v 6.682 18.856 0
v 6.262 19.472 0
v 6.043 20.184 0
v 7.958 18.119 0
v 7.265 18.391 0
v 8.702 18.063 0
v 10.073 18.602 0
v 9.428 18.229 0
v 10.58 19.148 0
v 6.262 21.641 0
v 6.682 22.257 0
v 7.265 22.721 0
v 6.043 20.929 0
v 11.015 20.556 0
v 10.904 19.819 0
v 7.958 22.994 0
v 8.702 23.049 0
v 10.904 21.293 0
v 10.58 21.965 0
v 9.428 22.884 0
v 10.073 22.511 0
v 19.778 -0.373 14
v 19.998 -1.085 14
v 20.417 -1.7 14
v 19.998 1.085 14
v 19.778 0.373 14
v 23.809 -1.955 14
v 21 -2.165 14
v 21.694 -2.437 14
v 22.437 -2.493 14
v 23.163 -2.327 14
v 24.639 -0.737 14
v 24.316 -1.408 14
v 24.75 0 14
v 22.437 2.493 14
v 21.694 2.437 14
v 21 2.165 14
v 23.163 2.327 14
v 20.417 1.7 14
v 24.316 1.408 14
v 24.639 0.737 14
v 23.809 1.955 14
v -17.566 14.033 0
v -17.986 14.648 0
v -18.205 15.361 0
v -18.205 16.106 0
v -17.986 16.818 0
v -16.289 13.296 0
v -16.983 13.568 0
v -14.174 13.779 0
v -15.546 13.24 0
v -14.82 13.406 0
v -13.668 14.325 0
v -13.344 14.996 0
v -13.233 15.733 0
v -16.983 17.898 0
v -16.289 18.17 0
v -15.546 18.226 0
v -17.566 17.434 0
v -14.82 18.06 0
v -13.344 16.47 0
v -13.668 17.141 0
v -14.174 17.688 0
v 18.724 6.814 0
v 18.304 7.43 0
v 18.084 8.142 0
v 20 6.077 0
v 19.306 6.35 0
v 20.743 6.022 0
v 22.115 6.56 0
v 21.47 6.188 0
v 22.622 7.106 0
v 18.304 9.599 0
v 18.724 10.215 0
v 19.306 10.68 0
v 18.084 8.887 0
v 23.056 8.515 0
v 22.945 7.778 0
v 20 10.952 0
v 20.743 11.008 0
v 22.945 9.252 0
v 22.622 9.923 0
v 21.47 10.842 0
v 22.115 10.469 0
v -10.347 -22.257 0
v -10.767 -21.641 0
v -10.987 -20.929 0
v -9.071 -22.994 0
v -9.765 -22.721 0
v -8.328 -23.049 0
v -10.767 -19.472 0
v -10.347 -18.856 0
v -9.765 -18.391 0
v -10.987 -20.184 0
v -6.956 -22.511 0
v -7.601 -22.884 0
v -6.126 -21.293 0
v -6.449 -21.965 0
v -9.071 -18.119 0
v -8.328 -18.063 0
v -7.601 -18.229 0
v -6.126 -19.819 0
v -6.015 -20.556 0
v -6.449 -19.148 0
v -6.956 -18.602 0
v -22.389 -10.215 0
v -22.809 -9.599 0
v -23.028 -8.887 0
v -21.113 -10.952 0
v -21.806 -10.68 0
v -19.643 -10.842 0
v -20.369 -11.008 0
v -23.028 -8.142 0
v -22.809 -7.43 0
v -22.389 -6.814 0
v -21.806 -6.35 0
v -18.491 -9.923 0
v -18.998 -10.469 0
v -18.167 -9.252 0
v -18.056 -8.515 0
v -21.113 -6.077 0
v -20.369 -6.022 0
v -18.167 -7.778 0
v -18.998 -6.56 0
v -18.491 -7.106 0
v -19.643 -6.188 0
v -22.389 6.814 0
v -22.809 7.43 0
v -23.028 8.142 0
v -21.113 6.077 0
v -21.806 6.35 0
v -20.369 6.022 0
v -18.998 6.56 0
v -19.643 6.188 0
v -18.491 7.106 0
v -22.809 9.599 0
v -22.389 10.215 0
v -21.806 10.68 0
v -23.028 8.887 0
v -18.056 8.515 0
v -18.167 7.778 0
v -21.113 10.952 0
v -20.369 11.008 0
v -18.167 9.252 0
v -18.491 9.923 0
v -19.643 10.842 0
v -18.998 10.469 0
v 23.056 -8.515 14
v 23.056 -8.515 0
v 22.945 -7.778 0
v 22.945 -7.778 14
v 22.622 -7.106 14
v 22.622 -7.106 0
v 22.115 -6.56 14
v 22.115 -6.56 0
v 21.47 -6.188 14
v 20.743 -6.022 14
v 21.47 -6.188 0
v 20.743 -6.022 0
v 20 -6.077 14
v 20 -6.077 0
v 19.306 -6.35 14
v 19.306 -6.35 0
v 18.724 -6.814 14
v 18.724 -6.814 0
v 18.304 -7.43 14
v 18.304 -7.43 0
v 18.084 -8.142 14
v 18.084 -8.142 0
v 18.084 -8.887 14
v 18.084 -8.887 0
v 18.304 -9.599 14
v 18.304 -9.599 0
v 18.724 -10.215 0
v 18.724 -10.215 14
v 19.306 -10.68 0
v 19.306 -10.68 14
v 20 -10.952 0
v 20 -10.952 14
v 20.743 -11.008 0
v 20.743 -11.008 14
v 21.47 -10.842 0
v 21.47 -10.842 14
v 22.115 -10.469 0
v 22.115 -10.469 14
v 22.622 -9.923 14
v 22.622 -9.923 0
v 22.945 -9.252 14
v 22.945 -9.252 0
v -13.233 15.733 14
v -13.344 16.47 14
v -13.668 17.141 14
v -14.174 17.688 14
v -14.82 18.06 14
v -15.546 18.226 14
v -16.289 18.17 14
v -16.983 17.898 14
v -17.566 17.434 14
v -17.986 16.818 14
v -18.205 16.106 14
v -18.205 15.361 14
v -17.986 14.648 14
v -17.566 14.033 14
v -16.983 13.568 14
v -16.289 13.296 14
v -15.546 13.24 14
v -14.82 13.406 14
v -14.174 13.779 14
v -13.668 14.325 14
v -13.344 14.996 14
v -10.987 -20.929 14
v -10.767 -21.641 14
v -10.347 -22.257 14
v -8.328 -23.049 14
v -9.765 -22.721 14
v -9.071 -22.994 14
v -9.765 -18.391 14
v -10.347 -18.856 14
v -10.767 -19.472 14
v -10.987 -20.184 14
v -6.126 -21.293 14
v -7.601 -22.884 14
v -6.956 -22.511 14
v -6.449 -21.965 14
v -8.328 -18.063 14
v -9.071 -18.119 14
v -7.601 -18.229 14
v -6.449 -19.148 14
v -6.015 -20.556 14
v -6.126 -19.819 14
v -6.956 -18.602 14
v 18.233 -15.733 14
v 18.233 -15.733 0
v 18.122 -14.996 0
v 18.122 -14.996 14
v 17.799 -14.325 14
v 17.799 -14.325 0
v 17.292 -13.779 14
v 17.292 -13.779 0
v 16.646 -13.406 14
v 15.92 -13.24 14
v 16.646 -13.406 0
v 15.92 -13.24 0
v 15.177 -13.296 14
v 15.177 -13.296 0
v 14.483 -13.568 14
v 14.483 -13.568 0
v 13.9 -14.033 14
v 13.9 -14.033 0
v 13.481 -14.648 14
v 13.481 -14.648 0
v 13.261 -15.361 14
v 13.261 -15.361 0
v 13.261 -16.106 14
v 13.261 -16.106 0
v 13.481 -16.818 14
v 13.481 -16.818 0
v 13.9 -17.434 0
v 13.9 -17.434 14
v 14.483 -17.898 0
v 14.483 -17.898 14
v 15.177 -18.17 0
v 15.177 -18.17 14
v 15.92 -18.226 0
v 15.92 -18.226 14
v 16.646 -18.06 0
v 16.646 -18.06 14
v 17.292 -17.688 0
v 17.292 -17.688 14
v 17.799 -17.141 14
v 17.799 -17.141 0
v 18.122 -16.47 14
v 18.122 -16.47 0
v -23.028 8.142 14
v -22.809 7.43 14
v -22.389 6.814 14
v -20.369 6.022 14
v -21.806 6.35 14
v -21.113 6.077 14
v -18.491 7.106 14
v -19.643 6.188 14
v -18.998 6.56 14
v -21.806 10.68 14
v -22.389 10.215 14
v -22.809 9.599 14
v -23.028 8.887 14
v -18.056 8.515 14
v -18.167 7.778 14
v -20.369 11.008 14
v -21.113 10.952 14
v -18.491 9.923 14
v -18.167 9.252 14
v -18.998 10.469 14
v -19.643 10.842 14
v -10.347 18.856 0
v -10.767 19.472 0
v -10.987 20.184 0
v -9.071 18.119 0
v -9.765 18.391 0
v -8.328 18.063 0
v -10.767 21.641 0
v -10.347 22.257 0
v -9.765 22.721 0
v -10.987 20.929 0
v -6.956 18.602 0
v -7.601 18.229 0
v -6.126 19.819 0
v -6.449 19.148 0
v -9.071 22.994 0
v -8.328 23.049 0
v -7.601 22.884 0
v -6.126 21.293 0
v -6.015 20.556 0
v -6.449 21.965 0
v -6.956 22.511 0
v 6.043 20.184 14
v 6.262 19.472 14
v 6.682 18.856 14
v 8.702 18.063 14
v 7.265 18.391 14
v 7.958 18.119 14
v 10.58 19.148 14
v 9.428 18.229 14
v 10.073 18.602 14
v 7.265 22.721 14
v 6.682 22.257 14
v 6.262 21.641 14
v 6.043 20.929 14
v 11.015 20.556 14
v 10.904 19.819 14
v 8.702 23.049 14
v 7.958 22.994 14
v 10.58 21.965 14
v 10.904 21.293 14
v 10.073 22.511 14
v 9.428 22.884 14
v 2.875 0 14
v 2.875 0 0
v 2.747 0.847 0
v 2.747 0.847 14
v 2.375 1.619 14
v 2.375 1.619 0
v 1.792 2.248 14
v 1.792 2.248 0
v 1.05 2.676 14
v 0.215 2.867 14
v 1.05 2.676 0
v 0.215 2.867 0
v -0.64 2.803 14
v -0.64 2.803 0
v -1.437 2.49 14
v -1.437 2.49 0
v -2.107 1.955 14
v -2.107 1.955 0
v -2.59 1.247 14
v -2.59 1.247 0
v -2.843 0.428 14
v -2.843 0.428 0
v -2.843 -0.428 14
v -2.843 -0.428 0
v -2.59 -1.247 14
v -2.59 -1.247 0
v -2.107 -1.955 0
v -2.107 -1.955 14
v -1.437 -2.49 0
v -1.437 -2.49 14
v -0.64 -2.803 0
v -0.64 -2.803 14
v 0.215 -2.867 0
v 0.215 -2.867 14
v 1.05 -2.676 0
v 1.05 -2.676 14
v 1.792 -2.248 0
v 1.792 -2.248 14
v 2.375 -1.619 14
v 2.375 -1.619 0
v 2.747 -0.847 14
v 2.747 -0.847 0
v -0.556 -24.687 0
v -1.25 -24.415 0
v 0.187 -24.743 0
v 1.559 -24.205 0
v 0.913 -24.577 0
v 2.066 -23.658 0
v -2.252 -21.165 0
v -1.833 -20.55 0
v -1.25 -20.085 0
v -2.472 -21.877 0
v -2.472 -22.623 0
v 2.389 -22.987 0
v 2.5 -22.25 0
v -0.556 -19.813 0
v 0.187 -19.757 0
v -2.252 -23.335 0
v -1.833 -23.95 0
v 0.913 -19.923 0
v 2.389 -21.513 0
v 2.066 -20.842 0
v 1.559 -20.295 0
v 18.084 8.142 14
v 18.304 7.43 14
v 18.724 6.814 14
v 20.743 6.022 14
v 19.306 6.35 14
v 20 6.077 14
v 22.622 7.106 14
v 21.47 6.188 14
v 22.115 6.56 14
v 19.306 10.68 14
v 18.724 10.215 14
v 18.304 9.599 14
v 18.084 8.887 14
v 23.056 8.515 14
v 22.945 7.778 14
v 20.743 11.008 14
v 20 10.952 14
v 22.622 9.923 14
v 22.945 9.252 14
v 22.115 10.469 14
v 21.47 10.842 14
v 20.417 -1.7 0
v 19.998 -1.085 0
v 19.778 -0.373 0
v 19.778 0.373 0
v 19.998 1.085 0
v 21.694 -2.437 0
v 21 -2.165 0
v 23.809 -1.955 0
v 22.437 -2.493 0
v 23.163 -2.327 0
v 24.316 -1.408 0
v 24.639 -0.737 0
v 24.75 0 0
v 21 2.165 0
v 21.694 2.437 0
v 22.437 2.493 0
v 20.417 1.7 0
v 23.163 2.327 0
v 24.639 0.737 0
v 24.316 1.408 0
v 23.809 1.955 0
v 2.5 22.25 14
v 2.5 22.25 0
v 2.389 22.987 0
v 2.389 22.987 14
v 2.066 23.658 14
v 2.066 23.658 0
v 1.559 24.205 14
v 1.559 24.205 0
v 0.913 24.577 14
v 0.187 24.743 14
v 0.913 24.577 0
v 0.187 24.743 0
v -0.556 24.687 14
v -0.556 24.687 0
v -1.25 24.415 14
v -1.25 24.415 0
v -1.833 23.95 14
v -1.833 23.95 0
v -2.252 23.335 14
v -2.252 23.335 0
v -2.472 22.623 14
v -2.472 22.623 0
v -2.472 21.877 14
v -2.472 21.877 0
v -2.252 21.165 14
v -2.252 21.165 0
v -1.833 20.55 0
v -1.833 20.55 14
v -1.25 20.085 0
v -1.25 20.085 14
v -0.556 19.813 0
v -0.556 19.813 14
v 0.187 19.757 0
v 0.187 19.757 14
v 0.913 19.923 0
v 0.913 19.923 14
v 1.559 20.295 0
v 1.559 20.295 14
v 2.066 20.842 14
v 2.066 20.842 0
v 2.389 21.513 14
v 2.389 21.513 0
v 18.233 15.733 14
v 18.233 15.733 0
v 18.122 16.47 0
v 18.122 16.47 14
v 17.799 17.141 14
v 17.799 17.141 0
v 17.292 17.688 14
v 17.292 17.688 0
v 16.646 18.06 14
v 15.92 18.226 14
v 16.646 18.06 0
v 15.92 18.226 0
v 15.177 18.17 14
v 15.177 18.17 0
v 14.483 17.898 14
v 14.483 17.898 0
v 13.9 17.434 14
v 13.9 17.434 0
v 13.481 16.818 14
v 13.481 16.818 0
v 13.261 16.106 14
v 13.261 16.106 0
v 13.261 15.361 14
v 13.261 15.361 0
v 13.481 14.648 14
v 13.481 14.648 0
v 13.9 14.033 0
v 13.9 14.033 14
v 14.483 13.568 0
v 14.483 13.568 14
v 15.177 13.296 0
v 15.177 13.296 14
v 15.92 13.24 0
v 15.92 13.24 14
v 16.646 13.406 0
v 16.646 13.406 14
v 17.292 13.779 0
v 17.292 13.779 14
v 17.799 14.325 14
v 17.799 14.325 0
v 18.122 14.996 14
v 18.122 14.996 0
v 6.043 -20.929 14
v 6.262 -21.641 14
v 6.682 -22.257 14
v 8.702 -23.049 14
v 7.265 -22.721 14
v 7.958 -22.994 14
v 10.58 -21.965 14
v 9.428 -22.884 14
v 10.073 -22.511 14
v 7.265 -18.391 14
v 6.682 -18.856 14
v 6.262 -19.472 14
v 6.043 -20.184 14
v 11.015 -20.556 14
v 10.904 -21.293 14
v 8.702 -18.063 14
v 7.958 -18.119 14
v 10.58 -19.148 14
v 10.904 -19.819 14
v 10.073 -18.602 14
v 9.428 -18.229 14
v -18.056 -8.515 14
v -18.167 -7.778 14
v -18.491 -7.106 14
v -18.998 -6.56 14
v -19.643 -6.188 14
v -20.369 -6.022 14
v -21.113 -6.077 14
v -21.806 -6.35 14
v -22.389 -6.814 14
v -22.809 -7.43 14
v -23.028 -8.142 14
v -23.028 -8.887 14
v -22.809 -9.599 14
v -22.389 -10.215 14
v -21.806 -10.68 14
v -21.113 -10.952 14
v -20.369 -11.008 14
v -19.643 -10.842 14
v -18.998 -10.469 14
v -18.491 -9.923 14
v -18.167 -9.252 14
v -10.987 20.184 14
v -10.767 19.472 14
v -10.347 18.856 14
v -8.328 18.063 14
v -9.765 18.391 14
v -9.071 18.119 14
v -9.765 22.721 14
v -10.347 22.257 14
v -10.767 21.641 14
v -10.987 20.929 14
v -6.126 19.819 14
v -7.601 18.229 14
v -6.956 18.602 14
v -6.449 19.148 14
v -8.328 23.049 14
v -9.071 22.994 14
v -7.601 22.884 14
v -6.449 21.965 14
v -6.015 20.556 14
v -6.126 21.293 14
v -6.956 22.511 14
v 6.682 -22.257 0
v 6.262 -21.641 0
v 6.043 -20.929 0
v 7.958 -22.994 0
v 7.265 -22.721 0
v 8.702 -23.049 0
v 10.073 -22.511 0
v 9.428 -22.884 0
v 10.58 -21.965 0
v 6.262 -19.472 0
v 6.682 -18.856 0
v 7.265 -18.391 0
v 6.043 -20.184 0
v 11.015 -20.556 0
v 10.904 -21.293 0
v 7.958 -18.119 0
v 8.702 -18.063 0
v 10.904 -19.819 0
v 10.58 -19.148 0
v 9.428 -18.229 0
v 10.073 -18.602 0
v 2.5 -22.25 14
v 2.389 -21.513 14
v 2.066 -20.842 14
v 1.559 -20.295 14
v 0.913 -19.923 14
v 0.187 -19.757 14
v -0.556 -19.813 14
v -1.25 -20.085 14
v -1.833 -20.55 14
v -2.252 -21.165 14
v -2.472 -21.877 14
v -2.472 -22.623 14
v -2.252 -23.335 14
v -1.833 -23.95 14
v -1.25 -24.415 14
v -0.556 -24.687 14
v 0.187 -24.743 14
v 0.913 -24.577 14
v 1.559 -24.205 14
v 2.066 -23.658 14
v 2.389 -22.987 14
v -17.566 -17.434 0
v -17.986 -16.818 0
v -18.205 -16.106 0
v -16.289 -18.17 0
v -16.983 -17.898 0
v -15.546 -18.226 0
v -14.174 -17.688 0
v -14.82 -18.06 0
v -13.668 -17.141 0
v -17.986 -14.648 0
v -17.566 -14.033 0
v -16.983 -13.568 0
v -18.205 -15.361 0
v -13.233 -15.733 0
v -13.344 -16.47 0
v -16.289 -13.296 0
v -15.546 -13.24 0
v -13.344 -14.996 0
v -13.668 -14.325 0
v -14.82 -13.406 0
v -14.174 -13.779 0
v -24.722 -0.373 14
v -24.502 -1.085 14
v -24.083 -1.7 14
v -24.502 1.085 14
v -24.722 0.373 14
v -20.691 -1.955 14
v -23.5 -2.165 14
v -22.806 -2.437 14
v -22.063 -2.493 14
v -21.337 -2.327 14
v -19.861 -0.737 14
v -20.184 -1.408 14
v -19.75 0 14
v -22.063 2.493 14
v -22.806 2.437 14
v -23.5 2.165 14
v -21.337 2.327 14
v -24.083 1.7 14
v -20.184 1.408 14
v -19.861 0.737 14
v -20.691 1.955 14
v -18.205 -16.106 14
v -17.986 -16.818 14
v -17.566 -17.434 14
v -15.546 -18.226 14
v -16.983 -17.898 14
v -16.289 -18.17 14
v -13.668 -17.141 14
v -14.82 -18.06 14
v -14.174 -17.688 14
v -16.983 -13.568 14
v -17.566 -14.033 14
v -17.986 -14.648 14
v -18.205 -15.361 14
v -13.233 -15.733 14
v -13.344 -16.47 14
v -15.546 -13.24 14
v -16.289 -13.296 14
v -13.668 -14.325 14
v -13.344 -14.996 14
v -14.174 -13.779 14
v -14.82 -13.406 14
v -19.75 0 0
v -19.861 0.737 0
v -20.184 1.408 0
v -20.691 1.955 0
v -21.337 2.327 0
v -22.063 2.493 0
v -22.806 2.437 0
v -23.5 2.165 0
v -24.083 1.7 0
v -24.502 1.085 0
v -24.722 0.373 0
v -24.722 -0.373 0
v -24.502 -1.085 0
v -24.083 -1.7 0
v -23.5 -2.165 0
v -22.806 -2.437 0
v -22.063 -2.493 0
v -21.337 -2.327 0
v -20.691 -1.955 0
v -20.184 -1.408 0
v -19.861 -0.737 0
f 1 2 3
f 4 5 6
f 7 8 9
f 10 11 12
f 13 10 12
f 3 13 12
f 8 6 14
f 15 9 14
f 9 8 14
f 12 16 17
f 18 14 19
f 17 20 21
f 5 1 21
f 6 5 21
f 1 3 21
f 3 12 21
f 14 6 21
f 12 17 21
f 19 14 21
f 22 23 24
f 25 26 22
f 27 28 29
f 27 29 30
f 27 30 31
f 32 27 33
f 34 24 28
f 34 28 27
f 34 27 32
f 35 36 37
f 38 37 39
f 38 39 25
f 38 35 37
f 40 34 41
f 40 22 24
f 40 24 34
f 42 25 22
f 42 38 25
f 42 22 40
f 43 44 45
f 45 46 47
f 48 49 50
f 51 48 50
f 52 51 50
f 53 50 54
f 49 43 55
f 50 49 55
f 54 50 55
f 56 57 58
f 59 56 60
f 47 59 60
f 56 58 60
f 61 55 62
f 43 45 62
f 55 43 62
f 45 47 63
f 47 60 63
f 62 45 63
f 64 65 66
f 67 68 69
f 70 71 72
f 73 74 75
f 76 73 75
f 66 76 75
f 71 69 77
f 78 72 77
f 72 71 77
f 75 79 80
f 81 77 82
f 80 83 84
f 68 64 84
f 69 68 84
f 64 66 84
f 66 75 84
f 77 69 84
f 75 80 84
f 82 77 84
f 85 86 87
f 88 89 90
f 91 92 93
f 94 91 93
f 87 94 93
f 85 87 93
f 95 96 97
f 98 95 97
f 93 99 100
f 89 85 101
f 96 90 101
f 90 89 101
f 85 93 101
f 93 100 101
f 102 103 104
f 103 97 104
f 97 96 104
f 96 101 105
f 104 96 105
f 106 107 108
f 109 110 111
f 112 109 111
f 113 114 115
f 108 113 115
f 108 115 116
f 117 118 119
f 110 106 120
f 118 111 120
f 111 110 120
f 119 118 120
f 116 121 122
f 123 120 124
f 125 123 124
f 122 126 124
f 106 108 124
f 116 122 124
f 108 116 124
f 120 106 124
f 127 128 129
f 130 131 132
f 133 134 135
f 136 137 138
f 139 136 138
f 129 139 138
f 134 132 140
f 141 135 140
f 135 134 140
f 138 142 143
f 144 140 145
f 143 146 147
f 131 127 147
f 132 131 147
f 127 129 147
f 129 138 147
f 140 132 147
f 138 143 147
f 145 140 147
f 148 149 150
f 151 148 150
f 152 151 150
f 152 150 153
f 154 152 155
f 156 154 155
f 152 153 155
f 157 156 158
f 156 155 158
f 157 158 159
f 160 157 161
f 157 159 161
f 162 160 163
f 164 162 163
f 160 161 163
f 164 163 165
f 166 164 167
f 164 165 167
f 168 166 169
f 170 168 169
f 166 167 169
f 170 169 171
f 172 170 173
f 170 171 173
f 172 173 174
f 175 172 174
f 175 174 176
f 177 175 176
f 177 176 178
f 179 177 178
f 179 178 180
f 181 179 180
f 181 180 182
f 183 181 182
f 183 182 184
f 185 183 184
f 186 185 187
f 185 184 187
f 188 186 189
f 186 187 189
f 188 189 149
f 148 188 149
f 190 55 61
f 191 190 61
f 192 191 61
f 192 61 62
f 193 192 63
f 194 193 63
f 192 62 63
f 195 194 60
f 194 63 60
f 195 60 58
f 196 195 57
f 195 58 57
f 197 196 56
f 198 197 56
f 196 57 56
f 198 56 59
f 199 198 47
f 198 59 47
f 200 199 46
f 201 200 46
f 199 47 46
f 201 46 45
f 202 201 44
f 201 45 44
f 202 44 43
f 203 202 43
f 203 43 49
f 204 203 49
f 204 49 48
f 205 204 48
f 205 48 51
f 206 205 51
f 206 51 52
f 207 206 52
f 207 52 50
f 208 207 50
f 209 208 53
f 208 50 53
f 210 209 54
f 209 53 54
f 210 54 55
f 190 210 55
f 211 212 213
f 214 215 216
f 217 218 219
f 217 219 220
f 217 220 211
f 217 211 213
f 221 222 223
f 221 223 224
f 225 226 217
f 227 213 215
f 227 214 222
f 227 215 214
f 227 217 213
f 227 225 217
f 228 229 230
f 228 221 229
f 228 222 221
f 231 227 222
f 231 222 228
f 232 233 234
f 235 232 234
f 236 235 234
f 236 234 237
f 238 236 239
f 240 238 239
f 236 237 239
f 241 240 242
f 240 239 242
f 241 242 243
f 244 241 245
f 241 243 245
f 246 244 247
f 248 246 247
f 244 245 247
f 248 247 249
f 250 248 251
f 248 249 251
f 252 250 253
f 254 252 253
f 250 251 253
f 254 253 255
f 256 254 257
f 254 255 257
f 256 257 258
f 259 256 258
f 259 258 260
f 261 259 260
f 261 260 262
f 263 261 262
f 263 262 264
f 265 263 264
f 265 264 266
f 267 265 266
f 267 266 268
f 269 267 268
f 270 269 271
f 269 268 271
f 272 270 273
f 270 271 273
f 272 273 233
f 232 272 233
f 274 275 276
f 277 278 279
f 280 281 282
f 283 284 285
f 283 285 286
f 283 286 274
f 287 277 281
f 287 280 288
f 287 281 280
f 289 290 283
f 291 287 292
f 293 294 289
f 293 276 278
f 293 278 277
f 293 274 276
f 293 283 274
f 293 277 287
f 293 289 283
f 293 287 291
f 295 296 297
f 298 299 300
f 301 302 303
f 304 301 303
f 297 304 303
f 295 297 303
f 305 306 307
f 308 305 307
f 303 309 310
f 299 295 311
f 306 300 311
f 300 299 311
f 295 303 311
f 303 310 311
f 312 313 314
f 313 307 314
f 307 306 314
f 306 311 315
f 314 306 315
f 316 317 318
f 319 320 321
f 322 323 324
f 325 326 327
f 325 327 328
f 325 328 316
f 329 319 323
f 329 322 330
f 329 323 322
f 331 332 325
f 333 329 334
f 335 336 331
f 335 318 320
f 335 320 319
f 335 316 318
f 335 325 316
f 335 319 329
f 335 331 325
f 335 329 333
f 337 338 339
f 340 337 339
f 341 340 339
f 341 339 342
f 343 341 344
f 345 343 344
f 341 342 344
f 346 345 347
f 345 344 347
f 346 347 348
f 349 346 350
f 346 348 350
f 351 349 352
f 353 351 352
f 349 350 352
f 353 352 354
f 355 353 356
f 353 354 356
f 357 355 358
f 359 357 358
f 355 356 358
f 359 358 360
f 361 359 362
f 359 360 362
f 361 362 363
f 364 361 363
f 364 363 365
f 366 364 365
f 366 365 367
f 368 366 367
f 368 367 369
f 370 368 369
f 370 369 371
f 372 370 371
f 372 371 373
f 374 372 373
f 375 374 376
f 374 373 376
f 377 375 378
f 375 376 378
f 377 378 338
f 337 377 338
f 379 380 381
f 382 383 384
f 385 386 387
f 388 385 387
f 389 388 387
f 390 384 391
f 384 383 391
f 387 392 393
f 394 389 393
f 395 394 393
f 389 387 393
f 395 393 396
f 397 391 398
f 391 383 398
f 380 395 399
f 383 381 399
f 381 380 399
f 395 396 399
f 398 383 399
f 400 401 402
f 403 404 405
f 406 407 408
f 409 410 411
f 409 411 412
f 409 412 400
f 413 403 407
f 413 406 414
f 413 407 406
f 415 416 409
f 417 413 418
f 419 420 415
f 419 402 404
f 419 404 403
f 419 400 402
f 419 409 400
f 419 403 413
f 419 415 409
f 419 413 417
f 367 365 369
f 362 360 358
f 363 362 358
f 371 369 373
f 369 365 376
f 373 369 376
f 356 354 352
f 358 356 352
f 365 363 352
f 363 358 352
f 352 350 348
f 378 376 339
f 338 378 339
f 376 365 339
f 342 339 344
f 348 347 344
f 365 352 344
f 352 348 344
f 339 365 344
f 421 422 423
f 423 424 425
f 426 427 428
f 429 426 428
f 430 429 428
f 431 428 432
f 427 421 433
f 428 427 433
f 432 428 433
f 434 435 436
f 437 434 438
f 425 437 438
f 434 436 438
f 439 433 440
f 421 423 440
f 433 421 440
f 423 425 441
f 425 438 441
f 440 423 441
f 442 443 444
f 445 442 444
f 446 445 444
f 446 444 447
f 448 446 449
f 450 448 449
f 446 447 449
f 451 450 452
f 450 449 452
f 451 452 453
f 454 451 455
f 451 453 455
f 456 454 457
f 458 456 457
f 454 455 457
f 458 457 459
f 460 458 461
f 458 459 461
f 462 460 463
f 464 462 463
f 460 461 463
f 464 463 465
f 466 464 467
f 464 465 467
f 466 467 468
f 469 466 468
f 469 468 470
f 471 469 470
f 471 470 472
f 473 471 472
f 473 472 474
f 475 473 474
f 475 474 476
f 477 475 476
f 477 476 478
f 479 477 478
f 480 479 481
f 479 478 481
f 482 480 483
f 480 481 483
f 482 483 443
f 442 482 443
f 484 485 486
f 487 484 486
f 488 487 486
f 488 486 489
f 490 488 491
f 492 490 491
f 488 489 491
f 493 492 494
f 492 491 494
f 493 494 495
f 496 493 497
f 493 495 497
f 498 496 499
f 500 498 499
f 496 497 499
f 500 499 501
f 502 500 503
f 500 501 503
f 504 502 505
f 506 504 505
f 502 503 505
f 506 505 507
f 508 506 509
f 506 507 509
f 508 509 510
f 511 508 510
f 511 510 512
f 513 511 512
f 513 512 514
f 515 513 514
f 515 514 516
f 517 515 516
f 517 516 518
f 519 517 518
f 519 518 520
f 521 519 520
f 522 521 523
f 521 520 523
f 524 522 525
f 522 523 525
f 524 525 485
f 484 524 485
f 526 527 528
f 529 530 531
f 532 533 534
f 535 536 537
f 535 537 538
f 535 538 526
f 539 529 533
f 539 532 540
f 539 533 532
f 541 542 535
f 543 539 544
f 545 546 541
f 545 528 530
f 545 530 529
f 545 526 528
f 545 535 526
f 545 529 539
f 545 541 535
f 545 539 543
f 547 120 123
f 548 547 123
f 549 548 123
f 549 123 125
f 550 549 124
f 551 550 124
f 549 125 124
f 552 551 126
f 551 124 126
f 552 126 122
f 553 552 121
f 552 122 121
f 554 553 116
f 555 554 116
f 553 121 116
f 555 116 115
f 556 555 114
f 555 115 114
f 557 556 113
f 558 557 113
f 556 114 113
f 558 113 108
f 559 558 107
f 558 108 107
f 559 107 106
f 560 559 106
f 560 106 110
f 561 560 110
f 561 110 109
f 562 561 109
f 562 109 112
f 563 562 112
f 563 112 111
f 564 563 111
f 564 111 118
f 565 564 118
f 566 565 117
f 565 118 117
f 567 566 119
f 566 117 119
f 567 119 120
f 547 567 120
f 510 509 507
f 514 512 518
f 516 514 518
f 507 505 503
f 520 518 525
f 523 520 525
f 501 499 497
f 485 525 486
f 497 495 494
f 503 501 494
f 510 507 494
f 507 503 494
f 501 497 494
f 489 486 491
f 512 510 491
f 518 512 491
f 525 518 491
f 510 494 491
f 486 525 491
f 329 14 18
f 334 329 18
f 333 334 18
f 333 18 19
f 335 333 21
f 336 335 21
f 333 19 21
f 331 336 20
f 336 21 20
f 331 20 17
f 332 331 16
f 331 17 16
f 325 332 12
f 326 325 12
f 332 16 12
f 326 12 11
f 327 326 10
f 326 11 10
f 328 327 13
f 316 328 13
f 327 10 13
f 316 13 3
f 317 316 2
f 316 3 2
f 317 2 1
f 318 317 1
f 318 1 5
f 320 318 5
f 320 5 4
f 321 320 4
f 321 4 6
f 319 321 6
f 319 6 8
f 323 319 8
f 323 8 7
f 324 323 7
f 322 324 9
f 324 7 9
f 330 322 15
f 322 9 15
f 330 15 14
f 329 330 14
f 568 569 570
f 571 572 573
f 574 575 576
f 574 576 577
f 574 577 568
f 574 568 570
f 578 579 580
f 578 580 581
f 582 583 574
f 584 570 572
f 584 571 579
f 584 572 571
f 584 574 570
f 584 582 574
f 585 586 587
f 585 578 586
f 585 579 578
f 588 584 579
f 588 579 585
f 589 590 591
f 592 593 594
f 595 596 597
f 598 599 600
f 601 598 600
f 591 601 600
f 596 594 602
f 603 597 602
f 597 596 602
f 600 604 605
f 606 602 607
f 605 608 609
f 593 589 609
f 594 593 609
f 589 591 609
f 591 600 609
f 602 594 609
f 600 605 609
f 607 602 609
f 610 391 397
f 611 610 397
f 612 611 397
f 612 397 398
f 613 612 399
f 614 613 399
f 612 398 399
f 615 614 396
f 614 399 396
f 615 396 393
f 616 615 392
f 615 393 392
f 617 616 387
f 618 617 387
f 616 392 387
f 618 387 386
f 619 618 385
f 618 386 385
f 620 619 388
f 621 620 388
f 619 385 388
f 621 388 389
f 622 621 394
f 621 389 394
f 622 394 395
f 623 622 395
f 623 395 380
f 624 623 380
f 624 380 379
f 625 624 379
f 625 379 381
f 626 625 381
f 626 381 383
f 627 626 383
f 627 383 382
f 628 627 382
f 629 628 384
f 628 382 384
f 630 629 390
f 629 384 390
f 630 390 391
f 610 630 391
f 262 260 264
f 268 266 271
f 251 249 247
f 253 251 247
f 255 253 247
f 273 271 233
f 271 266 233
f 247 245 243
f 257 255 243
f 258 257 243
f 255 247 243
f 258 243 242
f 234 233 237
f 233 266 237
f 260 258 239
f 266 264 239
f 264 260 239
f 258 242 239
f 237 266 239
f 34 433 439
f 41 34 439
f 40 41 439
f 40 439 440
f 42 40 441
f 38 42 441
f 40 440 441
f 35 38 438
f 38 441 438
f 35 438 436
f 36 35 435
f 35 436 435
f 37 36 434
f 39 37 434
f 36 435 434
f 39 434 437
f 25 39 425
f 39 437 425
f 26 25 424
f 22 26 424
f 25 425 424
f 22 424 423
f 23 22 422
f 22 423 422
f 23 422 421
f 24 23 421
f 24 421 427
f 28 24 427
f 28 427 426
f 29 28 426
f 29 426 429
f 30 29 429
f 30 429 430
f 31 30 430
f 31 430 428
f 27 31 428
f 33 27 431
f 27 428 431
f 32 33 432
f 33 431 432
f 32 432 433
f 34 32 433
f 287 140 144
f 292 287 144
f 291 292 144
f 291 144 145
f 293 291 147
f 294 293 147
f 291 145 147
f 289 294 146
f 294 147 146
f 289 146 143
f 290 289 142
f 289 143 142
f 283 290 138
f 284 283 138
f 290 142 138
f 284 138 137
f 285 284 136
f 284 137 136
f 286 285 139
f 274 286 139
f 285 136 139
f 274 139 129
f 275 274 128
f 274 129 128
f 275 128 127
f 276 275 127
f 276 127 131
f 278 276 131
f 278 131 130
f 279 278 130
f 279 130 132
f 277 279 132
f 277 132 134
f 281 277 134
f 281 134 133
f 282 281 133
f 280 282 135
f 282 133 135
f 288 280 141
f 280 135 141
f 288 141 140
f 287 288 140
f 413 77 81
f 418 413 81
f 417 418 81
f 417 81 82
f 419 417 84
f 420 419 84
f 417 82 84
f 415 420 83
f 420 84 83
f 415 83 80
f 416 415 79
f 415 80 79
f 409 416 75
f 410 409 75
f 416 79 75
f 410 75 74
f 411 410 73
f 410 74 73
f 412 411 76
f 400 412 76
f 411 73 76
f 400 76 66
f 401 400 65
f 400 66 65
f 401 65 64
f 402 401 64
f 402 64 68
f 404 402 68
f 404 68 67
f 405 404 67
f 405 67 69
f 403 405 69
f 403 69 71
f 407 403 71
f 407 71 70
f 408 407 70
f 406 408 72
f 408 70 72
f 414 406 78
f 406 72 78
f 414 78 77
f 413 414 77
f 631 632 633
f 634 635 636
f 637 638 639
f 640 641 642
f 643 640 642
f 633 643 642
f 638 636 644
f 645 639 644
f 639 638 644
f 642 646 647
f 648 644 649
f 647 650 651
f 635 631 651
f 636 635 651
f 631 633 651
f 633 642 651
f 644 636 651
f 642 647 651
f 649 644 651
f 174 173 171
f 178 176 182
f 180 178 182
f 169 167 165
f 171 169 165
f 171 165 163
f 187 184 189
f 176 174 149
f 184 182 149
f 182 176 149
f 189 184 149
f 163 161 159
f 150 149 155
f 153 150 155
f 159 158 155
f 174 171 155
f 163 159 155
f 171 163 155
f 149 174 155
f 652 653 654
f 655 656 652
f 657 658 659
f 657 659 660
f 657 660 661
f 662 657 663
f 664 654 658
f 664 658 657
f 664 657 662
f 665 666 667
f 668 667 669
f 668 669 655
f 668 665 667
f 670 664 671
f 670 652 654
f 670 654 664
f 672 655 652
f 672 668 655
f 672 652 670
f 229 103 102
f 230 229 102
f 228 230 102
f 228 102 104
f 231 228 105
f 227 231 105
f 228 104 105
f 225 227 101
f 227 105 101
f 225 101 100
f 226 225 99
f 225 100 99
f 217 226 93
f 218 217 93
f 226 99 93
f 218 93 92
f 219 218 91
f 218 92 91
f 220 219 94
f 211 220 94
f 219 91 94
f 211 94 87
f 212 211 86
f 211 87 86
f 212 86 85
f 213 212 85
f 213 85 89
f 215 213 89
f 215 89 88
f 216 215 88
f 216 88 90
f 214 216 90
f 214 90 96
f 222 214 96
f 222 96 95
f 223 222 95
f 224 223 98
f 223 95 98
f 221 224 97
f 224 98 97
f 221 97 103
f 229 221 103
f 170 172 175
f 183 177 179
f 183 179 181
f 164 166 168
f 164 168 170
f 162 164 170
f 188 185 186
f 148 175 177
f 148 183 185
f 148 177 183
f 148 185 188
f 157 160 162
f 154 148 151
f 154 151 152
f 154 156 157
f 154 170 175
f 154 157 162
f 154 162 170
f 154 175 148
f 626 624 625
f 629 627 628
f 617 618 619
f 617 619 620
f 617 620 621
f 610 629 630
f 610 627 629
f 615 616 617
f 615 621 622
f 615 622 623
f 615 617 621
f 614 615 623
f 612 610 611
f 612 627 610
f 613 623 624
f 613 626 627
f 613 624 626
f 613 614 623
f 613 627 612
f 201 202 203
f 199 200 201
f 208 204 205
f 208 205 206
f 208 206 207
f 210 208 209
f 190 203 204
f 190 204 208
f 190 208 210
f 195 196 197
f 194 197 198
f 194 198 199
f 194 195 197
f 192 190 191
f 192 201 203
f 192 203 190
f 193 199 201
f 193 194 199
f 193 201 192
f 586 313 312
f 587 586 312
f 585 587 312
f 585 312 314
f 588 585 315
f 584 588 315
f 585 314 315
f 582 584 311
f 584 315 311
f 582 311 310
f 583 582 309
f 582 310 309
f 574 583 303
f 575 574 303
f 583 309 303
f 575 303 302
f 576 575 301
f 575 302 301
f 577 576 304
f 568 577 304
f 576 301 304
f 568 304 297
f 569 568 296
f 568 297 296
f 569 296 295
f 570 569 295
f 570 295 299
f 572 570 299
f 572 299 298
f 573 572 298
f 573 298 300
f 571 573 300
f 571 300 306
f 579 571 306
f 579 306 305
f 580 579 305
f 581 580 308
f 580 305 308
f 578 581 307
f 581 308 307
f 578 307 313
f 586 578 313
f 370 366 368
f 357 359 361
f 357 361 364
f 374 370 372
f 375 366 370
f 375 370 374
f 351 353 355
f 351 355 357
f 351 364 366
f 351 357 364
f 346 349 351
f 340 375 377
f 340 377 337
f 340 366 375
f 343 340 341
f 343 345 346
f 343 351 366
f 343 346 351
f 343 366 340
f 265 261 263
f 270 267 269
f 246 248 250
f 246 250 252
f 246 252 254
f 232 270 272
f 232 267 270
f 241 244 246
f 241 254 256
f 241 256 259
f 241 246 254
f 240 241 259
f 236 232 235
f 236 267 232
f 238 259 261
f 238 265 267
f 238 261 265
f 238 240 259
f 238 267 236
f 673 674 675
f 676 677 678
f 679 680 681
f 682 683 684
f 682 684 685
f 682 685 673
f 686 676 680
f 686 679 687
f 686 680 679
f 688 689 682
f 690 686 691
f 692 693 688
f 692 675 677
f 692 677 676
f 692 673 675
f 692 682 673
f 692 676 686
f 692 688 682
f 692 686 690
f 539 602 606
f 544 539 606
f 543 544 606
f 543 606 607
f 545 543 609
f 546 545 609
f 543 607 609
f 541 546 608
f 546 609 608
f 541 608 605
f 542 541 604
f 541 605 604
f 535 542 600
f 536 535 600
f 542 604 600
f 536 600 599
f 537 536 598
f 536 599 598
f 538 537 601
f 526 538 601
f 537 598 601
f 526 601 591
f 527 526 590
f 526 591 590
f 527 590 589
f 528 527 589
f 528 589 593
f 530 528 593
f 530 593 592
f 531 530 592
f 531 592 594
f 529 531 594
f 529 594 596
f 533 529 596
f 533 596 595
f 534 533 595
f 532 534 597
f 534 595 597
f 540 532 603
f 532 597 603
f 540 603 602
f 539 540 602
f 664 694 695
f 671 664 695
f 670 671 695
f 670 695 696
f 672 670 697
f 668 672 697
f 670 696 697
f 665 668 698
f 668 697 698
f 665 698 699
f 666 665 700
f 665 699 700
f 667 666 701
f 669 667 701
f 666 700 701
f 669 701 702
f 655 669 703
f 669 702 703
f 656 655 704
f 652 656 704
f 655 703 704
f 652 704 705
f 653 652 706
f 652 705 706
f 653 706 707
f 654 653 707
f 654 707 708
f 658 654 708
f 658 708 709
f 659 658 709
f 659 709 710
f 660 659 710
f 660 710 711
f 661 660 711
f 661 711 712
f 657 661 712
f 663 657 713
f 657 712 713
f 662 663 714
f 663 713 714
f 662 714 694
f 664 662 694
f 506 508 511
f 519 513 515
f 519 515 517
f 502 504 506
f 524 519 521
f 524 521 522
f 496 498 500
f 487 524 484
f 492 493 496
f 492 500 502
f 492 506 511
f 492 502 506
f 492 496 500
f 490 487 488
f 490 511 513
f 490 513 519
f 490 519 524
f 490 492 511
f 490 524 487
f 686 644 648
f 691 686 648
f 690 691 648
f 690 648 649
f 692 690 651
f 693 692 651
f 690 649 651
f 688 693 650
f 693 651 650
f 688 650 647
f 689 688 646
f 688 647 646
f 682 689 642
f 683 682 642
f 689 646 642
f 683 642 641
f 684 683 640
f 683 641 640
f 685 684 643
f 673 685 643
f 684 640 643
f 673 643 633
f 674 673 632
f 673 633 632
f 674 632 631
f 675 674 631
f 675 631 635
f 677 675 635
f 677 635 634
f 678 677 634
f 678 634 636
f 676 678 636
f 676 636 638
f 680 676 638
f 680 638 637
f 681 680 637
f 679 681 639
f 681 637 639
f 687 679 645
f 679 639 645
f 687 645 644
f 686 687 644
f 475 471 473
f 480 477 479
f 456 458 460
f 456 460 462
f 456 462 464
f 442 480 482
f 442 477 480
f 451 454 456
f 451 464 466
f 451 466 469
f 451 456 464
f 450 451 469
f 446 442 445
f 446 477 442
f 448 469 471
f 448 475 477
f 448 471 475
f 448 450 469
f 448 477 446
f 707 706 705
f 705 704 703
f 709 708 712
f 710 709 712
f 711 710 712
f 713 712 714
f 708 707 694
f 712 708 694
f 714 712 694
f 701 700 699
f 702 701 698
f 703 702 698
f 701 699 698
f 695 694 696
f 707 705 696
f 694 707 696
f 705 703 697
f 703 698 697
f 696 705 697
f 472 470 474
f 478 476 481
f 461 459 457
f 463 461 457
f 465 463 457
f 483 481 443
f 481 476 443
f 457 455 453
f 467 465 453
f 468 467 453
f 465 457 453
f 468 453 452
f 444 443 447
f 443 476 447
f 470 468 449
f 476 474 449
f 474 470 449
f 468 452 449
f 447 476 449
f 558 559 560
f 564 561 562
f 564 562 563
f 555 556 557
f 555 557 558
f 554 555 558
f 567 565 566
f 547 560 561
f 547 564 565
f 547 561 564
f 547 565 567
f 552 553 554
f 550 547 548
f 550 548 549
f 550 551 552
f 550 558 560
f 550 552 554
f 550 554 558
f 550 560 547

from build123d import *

# Parameters (mm, degrees)
F0_R     = 2.5
F0_R_2   = 2.874861
F1_DEPTH = 14


with BuildPart() as f1:
    # F0 (on Top) → F1 (new body)
    with BuildSketch(Plane.XY):
        with Locations((8.514706, 20.55632)):
            Circle(F0_R)
        with Locations((20.55632, 8.514706)):
            Circle(F0_R)
        with Locations((15.733126, 15.733126)):
            Circle(F0_R)
        with Locations((0, 22.25)):
            Circle(F0_R)
        with Locations((-8.514706, 20.55632)):
            Circle(F0_R)
        with Locations((-15.733126, 15.733126)):
            Circle(F0_R)
        with Locations((-20.55632, 8.514706)):
            Circle(F0_R)
        with Locations((-22.25, 0)):
            Circle(F0_R)
        with Locations((-20.55632, -8.514706)):
            Circle(F0_R)
        with Locations((-15.733126, -15.733126)):
            Circle(F0_R)
        with Locations((-8.514706, -20.55632)):
            Circle(F0_R)
        with Locations((0, -22.25)):
            Circle(F0_R)
        with Locations((8.514706, -20.55632)):
            Circle(F0_R)
        with Locations((15.733126, -15.733126)):
            Circle(F0_R)
        with Locations((20.55632, -8.514706)):
            Circle(F0_R)
        with Locations((22.25, 0)):
            Circle(F0_R)
        Circle(F0_R_2)
    extrude(amount=F1_DEPTH)


solid = f1.part
